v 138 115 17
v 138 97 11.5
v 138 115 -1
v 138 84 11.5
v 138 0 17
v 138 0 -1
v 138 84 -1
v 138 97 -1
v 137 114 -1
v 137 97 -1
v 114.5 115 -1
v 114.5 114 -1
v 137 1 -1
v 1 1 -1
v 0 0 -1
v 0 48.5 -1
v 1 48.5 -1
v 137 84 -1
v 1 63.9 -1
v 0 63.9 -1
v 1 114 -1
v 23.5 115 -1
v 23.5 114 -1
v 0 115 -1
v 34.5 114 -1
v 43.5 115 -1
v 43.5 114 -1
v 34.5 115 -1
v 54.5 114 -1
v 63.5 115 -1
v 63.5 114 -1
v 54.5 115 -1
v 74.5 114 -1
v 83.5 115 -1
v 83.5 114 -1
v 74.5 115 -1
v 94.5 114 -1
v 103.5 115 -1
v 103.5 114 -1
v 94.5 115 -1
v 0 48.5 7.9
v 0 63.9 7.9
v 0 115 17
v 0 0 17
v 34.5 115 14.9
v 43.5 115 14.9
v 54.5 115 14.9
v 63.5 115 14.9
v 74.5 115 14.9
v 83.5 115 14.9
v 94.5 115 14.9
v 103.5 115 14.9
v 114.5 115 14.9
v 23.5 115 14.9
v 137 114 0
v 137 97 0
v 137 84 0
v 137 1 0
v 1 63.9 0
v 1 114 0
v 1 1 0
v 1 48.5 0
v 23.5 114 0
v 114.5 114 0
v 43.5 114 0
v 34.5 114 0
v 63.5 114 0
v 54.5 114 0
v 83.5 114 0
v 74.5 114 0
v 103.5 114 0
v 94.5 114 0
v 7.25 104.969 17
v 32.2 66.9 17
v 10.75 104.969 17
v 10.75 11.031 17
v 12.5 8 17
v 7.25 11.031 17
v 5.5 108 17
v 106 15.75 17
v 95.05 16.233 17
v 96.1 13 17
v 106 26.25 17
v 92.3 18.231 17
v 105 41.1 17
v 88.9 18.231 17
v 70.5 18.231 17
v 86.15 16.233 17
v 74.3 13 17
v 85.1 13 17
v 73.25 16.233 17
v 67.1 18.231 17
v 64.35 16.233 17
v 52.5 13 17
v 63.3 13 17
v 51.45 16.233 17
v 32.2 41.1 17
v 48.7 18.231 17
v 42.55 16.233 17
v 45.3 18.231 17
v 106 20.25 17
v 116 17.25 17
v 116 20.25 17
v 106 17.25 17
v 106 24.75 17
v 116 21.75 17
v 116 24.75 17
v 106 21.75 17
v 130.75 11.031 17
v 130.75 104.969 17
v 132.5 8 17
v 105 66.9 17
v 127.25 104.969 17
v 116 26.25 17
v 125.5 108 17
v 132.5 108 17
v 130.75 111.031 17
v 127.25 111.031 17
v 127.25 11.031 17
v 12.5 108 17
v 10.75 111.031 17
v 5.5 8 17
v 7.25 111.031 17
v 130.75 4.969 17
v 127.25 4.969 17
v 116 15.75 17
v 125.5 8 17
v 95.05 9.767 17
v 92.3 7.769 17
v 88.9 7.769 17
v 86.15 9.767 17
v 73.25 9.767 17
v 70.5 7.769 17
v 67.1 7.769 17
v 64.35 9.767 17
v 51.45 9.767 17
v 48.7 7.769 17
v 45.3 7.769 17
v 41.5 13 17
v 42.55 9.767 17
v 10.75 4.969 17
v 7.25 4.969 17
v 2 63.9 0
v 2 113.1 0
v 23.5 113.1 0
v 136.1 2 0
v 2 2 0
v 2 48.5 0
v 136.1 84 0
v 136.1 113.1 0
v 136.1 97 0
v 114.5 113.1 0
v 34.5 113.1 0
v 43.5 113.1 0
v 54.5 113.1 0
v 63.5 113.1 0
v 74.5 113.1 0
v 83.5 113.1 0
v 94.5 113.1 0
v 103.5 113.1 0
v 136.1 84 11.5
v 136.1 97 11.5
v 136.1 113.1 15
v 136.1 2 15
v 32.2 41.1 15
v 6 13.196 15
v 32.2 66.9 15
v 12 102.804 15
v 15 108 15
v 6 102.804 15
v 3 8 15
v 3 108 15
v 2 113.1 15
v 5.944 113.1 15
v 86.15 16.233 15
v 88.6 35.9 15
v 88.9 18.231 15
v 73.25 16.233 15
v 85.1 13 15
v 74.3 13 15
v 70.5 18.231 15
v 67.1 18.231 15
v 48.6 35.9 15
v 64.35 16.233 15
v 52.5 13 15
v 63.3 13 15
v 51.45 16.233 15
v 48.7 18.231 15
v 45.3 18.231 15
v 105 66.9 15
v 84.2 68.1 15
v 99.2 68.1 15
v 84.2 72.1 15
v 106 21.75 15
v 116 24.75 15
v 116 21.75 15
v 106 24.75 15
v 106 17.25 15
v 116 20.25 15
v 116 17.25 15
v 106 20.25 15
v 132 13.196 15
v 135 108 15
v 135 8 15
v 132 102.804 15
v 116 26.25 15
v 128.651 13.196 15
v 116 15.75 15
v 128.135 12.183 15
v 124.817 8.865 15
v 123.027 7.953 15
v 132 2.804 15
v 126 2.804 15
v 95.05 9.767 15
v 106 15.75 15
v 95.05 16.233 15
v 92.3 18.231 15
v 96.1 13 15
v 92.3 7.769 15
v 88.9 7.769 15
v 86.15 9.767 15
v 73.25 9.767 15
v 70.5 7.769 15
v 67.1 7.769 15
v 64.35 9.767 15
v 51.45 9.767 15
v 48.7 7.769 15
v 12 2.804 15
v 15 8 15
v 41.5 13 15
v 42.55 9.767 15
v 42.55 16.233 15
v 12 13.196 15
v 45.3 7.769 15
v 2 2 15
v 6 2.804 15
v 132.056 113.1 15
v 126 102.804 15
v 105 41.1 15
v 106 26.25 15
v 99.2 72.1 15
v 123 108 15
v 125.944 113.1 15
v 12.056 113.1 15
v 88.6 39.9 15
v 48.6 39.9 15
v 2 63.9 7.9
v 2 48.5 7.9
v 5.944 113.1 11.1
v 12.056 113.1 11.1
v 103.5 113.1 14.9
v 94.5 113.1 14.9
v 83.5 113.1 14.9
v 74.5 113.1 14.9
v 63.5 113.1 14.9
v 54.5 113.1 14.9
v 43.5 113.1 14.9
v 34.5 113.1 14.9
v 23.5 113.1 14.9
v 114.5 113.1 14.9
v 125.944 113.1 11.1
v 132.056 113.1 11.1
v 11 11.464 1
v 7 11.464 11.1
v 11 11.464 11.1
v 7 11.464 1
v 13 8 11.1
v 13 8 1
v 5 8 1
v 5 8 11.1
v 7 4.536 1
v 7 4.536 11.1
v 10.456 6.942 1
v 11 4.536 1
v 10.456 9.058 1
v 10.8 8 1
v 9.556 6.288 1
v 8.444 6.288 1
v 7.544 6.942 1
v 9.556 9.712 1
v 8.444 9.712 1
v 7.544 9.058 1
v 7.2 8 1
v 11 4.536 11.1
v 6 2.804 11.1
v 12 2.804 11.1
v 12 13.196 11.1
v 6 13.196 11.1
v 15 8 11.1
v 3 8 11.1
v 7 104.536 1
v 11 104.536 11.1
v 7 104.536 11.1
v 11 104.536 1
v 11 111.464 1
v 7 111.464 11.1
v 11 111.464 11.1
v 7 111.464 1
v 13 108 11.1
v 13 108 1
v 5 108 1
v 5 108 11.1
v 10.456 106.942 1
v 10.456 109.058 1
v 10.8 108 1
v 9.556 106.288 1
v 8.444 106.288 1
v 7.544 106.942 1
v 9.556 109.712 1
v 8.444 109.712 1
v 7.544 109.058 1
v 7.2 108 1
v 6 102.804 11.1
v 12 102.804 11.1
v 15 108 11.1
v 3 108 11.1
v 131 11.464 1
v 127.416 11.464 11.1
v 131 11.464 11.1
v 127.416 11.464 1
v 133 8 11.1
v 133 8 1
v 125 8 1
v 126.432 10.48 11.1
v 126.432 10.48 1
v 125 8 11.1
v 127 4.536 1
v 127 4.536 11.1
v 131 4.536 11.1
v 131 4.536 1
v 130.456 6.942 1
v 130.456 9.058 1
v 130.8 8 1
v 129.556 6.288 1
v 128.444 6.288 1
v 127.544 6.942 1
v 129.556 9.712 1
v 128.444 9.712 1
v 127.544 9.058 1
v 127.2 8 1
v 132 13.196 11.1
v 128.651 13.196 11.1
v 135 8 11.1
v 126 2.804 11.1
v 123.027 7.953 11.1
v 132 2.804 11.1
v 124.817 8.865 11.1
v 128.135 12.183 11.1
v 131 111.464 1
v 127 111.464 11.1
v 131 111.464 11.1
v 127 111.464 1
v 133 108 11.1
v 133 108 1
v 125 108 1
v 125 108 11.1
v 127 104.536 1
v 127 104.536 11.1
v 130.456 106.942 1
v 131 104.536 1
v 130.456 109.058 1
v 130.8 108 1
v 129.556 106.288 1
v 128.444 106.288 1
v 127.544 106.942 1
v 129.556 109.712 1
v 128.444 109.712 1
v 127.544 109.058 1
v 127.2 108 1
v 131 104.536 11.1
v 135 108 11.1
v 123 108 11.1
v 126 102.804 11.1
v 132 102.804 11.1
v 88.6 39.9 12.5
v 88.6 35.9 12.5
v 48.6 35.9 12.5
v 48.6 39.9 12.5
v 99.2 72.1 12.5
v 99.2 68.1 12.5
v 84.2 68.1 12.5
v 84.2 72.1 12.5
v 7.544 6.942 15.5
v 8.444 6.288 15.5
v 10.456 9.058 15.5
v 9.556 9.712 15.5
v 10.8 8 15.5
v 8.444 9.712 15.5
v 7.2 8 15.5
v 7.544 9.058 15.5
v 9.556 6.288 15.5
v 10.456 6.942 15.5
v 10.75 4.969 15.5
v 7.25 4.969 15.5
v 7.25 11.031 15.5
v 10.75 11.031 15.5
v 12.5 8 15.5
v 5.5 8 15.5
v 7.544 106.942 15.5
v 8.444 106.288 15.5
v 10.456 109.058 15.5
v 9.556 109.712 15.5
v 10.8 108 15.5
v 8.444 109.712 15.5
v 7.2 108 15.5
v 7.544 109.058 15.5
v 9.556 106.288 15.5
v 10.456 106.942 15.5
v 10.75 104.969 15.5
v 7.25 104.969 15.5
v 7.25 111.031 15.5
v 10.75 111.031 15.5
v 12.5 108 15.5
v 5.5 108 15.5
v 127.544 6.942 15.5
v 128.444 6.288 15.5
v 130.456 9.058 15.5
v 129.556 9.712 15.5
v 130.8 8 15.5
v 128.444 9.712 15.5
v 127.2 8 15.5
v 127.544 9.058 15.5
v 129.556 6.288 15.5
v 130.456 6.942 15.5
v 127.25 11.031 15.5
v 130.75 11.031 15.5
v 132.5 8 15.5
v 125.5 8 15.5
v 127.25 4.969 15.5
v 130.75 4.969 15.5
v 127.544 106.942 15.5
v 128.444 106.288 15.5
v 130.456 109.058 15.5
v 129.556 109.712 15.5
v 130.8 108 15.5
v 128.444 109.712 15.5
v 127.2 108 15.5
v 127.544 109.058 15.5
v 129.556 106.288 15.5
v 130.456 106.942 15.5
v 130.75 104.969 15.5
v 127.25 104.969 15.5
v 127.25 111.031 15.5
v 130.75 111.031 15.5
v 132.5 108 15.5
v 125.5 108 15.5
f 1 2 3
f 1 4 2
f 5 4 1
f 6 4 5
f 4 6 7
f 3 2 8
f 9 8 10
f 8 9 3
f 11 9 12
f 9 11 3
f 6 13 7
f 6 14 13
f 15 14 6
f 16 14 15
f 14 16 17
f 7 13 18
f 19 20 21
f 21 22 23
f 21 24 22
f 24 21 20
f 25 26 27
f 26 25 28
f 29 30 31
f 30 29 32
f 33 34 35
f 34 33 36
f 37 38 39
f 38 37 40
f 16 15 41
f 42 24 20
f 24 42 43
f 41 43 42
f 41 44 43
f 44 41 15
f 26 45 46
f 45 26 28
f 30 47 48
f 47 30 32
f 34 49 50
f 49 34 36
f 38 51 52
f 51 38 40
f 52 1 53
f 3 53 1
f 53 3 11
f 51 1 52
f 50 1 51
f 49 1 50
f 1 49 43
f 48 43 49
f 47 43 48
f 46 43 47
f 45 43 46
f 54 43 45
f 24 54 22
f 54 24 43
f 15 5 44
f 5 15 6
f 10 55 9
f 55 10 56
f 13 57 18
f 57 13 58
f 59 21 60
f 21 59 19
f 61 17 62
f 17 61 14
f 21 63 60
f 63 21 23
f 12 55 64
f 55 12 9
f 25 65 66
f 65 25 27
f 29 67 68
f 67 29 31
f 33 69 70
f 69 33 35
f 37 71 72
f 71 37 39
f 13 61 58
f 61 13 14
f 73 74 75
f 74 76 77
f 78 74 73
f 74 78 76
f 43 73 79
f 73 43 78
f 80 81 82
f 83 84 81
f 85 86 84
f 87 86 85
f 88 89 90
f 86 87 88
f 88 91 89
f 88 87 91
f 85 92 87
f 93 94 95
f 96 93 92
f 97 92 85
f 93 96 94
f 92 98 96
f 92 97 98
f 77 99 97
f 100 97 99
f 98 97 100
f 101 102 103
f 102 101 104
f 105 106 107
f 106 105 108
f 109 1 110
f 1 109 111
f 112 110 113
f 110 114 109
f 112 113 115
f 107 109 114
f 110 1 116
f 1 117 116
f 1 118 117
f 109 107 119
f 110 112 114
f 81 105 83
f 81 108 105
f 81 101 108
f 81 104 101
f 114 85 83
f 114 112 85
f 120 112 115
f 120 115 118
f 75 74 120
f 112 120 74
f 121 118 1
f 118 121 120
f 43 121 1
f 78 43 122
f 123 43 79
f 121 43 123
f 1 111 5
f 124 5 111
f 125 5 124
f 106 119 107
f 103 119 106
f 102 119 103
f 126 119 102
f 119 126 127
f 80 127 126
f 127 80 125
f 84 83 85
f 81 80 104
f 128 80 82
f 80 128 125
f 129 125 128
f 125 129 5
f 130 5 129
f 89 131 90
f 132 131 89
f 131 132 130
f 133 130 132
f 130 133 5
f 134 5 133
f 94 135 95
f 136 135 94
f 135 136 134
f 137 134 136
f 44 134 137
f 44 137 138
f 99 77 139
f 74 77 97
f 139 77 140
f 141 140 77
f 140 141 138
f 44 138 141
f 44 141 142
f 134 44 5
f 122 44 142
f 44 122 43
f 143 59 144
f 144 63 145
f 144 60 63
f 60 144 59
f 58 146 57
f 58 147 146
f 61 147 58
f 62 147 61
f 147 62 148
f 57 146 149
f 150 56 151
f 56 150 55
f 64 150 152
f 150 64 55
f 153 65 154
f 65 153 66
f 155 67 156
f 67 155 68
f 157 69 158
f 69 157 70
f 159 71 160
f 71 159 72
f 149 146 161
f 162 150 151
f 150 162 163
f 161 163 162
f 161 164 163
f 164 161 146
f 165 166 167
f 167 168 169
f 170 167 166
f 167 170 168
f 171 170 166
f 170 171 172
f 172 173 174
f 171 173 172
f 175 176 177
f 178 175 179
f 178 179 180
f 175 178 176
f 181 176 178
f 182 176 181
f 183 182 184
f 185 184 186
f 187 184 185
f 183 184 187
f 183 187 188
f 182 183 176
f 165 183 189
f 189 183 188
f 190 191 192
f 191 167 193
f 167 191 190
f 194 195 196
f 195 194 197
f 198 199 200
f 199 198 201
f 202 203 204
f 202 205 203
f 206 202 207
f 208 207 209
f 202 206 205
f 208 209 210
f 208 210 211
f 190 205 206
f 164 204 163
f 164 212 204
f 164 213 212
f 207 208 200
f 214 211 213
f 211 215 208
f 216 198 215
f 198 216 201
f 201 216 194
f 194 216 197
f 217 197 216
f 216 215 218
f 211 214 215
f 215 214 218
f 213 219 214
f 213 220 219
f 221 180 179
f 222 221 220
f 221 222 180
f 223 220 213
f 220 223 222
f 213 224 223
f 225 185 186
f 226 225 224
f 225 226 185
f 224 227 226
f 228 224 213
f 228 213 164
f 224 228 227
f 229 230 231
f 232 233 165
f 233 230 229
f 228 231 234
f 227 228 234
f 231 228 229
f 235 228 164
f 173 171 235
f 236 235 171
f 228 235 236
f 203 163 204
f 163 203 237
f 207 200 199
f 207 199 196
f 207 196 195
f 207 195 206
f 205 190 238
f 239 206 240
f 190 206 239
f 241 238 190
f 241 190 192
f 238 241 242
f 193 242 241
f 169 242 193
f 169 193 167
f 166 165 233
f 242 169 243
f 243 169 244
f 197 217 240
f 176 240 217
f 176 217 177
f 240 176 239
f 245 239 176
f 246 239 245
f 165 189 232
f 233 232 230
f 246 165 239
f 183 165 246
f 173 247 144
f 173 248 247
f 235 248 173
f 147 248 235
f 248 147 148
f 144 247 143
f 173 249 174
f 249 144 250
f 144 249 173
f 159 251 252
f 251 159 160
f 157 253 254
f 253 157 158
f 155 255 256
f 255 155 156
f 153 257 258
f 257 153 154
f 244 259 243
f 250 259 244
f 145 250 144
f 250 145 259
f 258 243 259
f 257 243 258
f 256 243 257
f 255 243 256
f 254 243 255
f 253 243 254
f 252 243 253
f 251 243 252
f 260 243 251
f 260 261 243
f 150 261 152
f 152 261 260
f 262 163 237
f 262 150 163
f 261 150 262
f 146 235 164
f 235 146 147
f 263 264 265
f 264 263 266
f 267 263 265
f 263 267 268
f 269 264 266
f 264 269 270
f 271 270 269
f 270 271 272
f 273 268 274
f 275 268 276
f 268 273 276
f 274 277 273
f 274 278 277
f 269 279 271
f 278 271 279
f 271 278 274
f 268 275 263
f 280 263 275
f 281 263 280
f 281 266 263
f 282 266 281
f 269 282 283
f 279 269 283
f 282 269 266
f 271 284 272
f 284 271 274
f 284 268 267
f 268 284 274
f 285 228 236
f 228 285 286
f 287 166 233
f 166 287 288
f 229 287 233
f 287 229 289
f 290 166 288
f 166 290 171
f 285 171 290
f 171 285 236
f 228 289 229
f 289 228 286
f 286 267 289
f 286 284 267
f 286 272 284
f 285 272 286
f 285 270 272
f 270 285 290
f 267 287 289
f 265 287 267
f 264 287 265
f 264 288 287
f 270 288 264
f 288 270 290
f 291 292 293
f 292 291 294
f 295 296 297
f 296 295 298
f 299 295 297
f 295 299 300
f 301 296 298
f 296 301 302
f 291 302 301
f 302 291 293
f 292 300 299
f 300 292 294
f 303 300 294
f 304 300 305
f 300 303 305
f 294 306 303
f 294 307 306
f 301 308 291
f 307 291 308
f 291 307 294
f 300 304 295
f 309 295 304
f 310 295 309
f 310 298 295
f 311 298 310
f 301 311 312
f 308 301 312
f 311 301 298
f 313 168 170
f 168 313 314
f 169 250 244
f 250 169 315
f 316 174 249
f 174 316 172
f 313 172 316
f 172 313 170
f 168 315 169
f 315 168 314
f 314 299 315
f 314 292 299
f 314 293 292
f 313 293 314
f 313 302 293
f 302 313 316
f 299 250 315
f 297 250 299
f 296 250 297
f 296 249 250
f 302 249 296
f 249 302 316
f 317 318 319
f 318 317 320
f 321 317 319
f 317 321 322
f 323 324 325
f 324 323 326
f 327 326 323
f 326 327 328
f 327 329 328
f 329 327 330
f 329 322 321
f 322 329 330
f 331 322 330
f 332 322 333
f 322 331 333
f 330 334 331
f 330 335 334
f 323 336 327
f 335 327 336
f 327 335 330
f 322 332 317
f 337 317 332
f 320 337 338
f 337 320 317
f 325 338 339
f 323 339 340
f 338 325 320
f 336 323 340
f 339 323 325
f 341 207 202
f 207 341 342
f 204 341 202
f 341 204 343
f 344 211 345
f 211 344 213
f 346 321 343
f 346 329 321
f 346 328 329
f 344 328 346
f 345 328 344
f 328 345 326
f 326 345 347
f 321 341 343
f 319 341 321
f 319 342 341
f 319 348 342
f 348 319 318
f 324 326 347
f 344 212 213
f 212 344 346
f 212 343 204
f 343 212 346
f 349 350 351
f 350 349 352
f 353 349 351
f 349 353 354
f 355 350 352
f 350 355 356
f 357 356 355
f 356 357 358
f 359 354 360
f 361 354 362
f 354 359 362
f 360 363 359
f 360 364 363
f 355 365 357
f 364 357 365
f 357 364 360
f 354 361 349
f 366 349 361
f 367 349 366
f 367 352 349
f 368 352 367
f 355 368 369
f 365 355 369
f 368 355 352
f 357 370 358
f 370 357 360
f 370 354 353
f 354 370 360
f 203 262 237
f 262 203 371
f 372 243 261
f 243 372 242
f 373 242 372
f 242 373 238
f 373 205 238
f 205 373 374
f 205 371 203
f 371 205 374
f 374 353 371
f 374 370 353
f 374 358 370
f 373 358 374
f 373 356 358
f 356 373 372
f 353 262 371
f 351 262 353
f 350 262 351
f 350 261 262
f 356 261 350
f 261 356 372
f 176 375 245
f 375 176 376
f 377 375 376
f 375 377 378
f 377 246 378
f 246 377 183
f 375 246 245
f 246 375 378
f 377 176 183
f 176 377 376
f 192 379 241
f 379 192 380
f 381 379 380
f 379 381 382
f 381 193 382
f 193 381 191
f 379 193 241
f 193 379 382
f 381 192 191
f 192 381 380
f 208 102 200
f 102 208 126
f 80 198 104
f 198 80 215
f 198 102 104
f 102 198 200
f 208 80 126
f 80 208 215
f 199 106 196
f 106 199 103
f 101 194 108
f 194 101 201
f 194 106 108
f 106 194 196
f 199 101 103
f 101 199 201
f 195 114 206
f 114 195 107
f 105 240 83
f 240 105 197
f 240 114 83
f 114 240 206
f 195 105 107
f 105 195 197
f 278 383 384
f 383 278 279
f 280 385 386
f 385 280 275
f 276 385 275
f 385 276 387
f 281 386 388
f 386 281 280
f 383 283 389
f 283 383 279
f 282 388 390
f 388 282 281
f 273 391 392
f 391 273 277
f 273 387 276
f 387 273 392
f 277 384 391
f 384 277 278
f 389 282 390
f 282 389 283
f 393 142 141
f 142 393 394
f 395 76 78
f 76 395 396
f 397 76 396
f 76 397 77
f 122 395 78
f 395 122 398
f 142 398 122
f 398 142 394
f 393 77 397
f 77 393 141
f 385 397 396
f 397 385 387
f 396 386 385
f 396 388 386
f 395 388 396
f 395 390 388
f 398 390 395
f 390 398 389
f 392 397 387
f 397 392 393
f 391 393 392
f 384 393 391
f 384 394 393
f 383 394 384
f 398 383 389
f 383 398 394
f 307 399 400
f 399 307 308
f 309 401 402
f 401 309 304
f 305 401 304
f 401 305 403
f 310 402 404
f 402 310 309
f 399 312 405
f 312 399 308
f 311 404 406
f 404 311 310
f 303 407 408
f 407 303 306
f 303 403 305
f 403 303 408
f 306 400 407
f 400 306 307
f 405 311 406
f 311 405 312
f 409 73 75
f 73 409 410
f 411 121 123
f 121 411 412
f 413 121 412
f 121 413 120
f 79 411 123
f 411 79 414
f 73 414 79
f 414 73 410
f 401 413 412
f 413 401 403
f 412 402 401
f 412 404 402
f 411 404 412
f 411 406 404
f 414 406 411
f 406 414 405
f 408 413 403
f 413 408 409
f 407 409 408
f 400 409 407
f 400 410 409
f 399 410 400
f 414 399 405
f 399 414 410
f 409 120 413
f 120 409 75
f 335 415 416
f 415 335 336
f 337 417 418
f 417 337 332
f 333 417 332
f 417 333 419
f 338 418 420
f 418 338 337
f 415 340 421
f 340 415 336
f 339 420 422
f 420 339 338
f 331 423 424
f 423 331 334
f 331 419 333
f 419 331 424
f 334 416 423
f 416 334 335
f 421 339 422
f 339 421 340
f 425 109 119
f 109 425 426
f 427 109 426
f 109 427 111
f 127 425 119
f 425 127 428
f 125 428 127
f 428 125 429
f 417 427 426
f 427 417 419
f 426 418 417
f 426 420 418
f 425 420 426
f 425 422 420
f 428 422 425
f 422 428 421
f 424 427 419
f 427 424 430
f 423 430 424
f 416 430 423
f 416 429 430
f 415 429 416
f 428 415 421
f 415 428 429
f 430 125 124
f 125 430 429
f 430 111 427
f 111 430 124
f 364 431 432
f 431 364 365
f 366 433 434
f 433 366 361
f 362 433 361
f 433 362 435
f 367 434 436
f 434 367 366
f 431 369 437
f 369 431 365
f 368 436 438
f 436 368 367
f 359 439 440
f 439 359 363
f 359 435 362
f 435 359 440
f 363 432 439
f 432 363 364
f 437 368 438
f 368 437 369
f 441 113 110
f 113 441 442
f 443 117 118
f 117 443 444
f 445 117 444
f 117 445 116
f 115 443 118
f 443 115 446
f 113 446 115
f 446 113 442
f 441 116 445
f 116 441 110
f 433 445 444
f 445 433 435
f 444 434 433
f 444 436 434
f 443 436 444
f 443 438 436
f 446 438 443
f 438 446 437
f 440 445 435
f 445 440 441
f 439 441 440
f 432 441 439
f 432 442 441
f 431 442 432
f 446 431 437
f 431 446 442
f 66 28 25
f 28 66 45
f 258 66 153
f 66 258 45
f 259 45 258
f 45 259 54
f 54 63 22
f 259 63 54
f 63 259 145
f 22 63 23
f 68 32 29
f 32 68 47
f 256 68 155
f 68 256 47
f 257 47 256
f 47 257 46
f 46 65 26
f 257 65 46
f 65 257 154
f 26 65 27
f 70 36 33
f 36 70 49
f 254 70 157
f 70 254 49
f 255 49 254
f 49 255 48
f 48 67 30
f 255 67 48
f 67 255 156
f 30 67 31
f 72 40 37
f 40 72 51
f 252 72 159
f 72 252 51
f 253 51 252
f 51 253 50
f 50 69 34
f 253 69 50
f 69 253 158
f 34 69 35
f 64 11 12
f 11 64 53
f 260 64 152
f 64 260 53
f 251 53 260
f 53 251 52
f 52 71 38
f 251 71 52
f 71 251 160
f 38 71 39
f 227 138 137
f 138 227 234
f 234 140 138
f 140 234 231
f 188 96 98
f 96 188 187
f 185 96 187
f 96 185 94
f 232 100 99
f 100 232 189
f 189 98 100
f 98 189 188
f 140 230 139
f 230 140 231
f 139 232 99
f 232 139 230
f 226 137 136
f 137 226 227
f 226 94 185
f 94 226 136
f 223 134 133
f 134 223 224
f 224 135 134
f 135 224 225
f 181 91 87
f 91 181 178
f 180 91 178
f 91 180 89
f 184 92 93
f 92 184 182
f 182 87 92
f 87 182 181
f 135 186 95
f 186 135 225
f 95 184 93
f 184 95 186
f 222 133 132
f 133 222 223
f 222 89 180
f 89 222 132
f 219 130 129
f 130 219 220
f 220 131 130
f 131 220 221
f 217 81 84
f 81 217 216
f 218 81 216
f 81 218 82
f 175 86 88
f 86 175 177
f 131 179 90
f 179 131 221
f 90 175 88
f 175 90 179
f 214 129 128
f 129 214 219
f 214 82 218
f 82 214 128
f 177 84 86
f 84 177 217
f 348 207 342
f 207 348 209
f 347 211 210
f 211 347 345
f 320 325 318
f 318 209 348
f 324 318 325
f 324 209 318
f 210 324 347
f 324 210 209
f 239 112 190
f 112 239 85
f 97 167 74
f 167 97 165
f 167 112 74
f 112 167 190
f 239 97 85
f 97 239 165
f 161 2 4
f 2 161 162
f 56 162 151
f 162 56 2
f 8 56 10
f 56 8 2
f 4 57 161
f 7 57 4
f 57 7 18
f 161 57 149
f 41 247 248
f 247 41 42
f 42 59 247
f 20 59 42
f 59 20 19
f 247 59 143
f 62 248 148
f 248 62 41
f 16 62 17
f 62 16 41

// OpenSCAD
tol = 0.5;
screen_tol = 0.8;
pcb_x = 130;
pcb_y = 110;
pcb_z = 4;
bolt_d = 3.6;
shift_bolt = 5;
board_w = 1;
board_h = 1;


// box thickness
th = 2;

shift_x = 4;
shift_y = th + 1;

box_x = pcb_x + shift_x + 4;
box_y = pcb_y + shift_y + th;

pcb_width = 2;
pcb_up = 9;

box_z = th + pcb_up + pcb_width - 1;

socket_h = 15;
socket_w = 10;
socket_n = 5;
socket_int = 20;
start_socket_x = 20 + shift_x;
eps = 1e-1;

usb_type_b_w = 12;
usb_type_b_h = 11;
start_type_b_y = shift_y + 81.5;
//start_type_b_z = th + pcb_z + tol;

usb_type_a_w = 14.4;
usb_type_a_h = 7.8;
start_type_a_y = shift_y + 46;
//start_type_a_z = th + pcb_z + tol;

// programmator
micro_x = 10;
micro_y = 21.1;
micro_start_x = shift_x + 4.75;
micro_start_y = shift_y + pcb_y - 23.3 - micro_y;

contrast_start_x = shift_x + 38.4;
contrast_start_y = shift_y + 25.7;
volume_start_x = shift_x + pcb_x - 39.2;
volume_start_y = contrast_start_y;
pot_d = 7;
under_pcb = 13;
fn = 10;
gaika_h = 4;
gaika_w = 5.5;
stoiki_r = 4;
wide_stoiki_r = stoiki_r + 2;



translate([0,0,-50]) {

difference() {
  union() {
    difference() {
      union() {
        cube([box_x,box_y, box_z-board_h], false);
        translate([th - board_w, th - board_w, 0]) {
          cube([box_x - 2*(th - board_w), box_y - 2*(th -board_w), box_z], false);
        }
      }
      translate([th, th, th]) {
        cube([box_x-2*th+eps, box_y-2*th+eps, box_z-th+eps], false);
      }
    }
    // under_pcb, stoiki
    for (dy = [shift_y+shift_bolt, shift_y+pcb_y-shift_bolt]) {
      for (dx = [shift_x+shift_bolt, shift_x+pcb_x-shift_bolt]) {
//        translate([dx,dy,pcb_up/2+th-eps]) {
//          cube(size=[under_pcb,under_pcb,pcb_up], center=true);
//        }
        translate([dx,dy,th-eps]) {
          cylinder($fn=6, r=stoiki_r, h=pcb_up);
          cylinder($fn=6, r=wide_stoiki_r, h=gaika_h);
        }
      }
    }
    translate([box_x/2, box_y/2, th-eps]) {
      cylinder($fn=6, r=stoiki_r, h=pcb_up);
    }
  }

  // bolts
  for (dx = [shift_x+shift_bolt, shift_x+pcb_x-shift_bolt]) {
    for (dy = [shift_y+shift_bolt, shift_y+pcb_y-shift_bolt]) {
      translate([dx,dy,-eps]) {
        cylinder($fn=fn, r=bolt_d/2, h=th+pcb_up+2*eps);
        // gaika
        cylinder($fn=6, r=gaika_w / 2 / cos(30) + 0.05, h=gaika_h);
      }
    }
  }

//    // usb_in1 type b
//    translate([box_x-th-eps, start_type_b_y-tol, start_type_b_z]) {
//        cube(size=[th+2*eps, usb_type_b_w+2*tol, box_z]);
//    }

//    // usb_out1 type a
//    translate([-eps, start_type_a_y - tol, start_type_a_z]) {
//        cube(size=[th+2*eps, usb_type_a_w + 2*tol, box_z]);
//    }

    // programmator
    translate([micro_start_x-tol,micro_start_y-tol, -eps]) {
      cube(size=[micro_x+2*tol, micro_y+2*tol, th+2*eps]);
    }

    // contrast
    translate([contrast_start_x, contrast_start_y, -eps]) {
      cylinder($fn=fn, r=pot_d/2, h=th+2*eps);
    }

    // volume
//    translate([volume_start_x, volume_start_y, -eps]) {
//      cylinder($fn=20, r=pot_d/2, h=th+2*eps);
//    }
}
}

top_box_z = 15 + th;
stoiki_h = top_box_z - th;
wide_stoiki_h = 4;
pcb_room = 1;
screen_start_x = shift_x + 29;
screen_start_y = shift_y + 38.9;
screen_length_x = 71.2;
screen_length_y = 24.2;
screen_hold_x = 40;
screen_hold_y = 4;
screen_hold_start_z = 12.5;
screen_hold_y_shift = 2;
screen_hold_up_x = 15;
screen_hold_up_x_shift = 5;

master_button_y = shift_y + 10;
master_button_x = shift_x + 43;
master_button_int = 21.8;
master_button_r = 5;
top_bolt_h = 1.5;
top_bolt_r = 3.5;
speaker_shift = 18;
speaker_r = 15;
speaker_h = 15;
speaker_hole_d = 10;
speaker_hole_int = 3;
speaker_hole_w = 1.5;
speaker_shift = 18;

!difference() {
  union() {
    // board
    translate([0, 0, -board_h]) {
	difference() {
	    cube([box_x, box_y, board_h + eps], false);
	    translate([board_w, board_w, -eps]) {
		cube([box_x - 2*board_w, box_y - 2*board_w, board_h + 3*eps], false);
	    }
	}
    }
    difference() {
      cube([box_x,box_y,top_box_z], false);
      translate([th, th, -eps]) {
        cube([box_x-2*th+eps, box_y-2*th+eps, top_box_z-th+eps], false);
      }
    }
    // stoiki
    for (dx = [shift_x+shift_bolt, shift_x+pcb_x-shift_bolt]) {
      for (dy = [shift_y+shift_bolt, shift_y+pcb_y-shift_bolt]) {
        translate([dx,dy,pcb_room]) {
          cylinder($fn=6, r=stoiki_r, h=top_box_z-th+eps);
        }
        translate([dx,dy,top_box_z-th-wide_stoiki_h+eps]) {
          cylinder($fn=6, r=wide_stoiki_r, h=wide_stoiki_h+th-2*eps);
        }
      }
    }
    // screen_hold
    translate([screen_start_x + (screen_length_x - screen_hold_x)/2, screen_start_y - screen_hold_y_shift - screen_hold_y, screen_hold_start_z]) {
	cube([screen_hold_x, screen_hold_y, top_box_z - screen_hold_start_z - th + eps]);
    }
    translate([screen_start_x + screen_length_x - screen_hold_up_x - screen_hold_up_x_shift, screen_start_y + screen_length_y + screen_hold_y_shift, screen_hold_start_z]) {
	cube([screen_hold_up_x, screen_hold_y, top_box_z - screen_hold_start_z - th + eps]);
    }
  }
  // - speaker na stoikah
  translate([shift_x + pcb_x - 18, shift_y + 18, 0]) {
    cylinder(r=speaker_r, h = 15, $fn=20);
  }
  // speaker_hole
  for (dy = [shift_y + speaker_shift - speaker_hole_int - speaker_hole_w*3/2, 
             shift_y + speaker_shift - speaker_hole_w/2, 
             shift_y + speaker_shift + speaker_hole_int + speaker_hole_w/2]) { 
    translate([shift_x + pcb_x - speaker_shift - speaker_hole_d, dy, top_box_z-th-eps]) {
      cube(size=[speaker_hole_d, speaker_hole_w, th + 2*eps]);
    }
  }

  // bolts
  for (dx = [shift_x+shift_bolt, shift_x+pcb_x-shift_bolt]) {
    for (dy = [shift_y+shift_bolt, shift_y+pcb_y-shift_bolt]) {
      translate([dx,dy,-eps]) {
        cylinder($fn=fn, r=bolt_d/2, h=top_box_z+2*eps);
      }
      translate([dx, dy, top_box_z - top_bolt_h]) {
        //cylinder($fn=6, r=gaika_w / 2 / cos(30) + 0.05, h=wide_stoiki_h+eps);
        cylinder($fn=6, r=top_bolt_r, h=top_bolt_h + eps);
      }
    }
  }

  // screen
  translate([screen_start_x - screen_tol, screen_start_y - screen_tol, top_box_z - th - eps]) {
      cube([screen_length_x + 2*screen_tol, screen_length_y + 2*screen_tol, th + 2*eps]);
  }
  // sockets
  for (i = [0:1:socket_n-1]) {
      translate([start_socket_x+i*socket_int - tol, box_y-th-eps, -eps - board_h]) {
        cube(size=[socket_w + 2*tol, th+2*eps, socket_h + board_h]);
      }
  }
  // type_b
  translate([box_x - th - eps, start_type_b_y - tol, -tol - board_h]) {
      cube([th + 2*eps, usb_type_b_w + 2*tol, usb_type_b_h + 2*tol + board_h]);
  }
  // type_a
  translate([-eps, start_type_a_y - tol, -eps - board_h]) {
      cube([th + 2*eps, usb_type_a_w + 2*tol, usb_type_a_h + 2*eps + board_h]);
  }
  // master buttons
  for (i = [0:1:2]) {
    translate([master_button_x + master_button_int*i, master_button_y, top_box_z - th - eps]) {
      cylinder($fn=fn, r=master_button_r + tol, h=th+2*eps);
    }
  }
}


//// bolts
//for (dx = [shift_x+shift_bolt, shift_x+pcb_x-shift_bolt]) {
//  for (dy = [shift_y+shift_bolt, shift_y+pcb_y-shift_bolt]) {
//    difference() {
//      translate([dx,dy,pcb_up/2+th]) {
//        cube(size=[a,a,pcb_up], center=true);
//      }
//      translate([dx,dy,-eps]) {
//        cylinder($fn=20, r=bolt_d/2, h=th+pcb_up+2*eps);
//      }
//    }
//  }
//}


//leg_r = t;
//shift = t/2+leg_r;
//for (dx = [shift, a-shift])
//    for (dy = [shift, b-shift]) {
//        translate([dx, dy, 0]) {
//            cylinder(h=c, r=leg_r, $fn=40);
//        }
//    }
